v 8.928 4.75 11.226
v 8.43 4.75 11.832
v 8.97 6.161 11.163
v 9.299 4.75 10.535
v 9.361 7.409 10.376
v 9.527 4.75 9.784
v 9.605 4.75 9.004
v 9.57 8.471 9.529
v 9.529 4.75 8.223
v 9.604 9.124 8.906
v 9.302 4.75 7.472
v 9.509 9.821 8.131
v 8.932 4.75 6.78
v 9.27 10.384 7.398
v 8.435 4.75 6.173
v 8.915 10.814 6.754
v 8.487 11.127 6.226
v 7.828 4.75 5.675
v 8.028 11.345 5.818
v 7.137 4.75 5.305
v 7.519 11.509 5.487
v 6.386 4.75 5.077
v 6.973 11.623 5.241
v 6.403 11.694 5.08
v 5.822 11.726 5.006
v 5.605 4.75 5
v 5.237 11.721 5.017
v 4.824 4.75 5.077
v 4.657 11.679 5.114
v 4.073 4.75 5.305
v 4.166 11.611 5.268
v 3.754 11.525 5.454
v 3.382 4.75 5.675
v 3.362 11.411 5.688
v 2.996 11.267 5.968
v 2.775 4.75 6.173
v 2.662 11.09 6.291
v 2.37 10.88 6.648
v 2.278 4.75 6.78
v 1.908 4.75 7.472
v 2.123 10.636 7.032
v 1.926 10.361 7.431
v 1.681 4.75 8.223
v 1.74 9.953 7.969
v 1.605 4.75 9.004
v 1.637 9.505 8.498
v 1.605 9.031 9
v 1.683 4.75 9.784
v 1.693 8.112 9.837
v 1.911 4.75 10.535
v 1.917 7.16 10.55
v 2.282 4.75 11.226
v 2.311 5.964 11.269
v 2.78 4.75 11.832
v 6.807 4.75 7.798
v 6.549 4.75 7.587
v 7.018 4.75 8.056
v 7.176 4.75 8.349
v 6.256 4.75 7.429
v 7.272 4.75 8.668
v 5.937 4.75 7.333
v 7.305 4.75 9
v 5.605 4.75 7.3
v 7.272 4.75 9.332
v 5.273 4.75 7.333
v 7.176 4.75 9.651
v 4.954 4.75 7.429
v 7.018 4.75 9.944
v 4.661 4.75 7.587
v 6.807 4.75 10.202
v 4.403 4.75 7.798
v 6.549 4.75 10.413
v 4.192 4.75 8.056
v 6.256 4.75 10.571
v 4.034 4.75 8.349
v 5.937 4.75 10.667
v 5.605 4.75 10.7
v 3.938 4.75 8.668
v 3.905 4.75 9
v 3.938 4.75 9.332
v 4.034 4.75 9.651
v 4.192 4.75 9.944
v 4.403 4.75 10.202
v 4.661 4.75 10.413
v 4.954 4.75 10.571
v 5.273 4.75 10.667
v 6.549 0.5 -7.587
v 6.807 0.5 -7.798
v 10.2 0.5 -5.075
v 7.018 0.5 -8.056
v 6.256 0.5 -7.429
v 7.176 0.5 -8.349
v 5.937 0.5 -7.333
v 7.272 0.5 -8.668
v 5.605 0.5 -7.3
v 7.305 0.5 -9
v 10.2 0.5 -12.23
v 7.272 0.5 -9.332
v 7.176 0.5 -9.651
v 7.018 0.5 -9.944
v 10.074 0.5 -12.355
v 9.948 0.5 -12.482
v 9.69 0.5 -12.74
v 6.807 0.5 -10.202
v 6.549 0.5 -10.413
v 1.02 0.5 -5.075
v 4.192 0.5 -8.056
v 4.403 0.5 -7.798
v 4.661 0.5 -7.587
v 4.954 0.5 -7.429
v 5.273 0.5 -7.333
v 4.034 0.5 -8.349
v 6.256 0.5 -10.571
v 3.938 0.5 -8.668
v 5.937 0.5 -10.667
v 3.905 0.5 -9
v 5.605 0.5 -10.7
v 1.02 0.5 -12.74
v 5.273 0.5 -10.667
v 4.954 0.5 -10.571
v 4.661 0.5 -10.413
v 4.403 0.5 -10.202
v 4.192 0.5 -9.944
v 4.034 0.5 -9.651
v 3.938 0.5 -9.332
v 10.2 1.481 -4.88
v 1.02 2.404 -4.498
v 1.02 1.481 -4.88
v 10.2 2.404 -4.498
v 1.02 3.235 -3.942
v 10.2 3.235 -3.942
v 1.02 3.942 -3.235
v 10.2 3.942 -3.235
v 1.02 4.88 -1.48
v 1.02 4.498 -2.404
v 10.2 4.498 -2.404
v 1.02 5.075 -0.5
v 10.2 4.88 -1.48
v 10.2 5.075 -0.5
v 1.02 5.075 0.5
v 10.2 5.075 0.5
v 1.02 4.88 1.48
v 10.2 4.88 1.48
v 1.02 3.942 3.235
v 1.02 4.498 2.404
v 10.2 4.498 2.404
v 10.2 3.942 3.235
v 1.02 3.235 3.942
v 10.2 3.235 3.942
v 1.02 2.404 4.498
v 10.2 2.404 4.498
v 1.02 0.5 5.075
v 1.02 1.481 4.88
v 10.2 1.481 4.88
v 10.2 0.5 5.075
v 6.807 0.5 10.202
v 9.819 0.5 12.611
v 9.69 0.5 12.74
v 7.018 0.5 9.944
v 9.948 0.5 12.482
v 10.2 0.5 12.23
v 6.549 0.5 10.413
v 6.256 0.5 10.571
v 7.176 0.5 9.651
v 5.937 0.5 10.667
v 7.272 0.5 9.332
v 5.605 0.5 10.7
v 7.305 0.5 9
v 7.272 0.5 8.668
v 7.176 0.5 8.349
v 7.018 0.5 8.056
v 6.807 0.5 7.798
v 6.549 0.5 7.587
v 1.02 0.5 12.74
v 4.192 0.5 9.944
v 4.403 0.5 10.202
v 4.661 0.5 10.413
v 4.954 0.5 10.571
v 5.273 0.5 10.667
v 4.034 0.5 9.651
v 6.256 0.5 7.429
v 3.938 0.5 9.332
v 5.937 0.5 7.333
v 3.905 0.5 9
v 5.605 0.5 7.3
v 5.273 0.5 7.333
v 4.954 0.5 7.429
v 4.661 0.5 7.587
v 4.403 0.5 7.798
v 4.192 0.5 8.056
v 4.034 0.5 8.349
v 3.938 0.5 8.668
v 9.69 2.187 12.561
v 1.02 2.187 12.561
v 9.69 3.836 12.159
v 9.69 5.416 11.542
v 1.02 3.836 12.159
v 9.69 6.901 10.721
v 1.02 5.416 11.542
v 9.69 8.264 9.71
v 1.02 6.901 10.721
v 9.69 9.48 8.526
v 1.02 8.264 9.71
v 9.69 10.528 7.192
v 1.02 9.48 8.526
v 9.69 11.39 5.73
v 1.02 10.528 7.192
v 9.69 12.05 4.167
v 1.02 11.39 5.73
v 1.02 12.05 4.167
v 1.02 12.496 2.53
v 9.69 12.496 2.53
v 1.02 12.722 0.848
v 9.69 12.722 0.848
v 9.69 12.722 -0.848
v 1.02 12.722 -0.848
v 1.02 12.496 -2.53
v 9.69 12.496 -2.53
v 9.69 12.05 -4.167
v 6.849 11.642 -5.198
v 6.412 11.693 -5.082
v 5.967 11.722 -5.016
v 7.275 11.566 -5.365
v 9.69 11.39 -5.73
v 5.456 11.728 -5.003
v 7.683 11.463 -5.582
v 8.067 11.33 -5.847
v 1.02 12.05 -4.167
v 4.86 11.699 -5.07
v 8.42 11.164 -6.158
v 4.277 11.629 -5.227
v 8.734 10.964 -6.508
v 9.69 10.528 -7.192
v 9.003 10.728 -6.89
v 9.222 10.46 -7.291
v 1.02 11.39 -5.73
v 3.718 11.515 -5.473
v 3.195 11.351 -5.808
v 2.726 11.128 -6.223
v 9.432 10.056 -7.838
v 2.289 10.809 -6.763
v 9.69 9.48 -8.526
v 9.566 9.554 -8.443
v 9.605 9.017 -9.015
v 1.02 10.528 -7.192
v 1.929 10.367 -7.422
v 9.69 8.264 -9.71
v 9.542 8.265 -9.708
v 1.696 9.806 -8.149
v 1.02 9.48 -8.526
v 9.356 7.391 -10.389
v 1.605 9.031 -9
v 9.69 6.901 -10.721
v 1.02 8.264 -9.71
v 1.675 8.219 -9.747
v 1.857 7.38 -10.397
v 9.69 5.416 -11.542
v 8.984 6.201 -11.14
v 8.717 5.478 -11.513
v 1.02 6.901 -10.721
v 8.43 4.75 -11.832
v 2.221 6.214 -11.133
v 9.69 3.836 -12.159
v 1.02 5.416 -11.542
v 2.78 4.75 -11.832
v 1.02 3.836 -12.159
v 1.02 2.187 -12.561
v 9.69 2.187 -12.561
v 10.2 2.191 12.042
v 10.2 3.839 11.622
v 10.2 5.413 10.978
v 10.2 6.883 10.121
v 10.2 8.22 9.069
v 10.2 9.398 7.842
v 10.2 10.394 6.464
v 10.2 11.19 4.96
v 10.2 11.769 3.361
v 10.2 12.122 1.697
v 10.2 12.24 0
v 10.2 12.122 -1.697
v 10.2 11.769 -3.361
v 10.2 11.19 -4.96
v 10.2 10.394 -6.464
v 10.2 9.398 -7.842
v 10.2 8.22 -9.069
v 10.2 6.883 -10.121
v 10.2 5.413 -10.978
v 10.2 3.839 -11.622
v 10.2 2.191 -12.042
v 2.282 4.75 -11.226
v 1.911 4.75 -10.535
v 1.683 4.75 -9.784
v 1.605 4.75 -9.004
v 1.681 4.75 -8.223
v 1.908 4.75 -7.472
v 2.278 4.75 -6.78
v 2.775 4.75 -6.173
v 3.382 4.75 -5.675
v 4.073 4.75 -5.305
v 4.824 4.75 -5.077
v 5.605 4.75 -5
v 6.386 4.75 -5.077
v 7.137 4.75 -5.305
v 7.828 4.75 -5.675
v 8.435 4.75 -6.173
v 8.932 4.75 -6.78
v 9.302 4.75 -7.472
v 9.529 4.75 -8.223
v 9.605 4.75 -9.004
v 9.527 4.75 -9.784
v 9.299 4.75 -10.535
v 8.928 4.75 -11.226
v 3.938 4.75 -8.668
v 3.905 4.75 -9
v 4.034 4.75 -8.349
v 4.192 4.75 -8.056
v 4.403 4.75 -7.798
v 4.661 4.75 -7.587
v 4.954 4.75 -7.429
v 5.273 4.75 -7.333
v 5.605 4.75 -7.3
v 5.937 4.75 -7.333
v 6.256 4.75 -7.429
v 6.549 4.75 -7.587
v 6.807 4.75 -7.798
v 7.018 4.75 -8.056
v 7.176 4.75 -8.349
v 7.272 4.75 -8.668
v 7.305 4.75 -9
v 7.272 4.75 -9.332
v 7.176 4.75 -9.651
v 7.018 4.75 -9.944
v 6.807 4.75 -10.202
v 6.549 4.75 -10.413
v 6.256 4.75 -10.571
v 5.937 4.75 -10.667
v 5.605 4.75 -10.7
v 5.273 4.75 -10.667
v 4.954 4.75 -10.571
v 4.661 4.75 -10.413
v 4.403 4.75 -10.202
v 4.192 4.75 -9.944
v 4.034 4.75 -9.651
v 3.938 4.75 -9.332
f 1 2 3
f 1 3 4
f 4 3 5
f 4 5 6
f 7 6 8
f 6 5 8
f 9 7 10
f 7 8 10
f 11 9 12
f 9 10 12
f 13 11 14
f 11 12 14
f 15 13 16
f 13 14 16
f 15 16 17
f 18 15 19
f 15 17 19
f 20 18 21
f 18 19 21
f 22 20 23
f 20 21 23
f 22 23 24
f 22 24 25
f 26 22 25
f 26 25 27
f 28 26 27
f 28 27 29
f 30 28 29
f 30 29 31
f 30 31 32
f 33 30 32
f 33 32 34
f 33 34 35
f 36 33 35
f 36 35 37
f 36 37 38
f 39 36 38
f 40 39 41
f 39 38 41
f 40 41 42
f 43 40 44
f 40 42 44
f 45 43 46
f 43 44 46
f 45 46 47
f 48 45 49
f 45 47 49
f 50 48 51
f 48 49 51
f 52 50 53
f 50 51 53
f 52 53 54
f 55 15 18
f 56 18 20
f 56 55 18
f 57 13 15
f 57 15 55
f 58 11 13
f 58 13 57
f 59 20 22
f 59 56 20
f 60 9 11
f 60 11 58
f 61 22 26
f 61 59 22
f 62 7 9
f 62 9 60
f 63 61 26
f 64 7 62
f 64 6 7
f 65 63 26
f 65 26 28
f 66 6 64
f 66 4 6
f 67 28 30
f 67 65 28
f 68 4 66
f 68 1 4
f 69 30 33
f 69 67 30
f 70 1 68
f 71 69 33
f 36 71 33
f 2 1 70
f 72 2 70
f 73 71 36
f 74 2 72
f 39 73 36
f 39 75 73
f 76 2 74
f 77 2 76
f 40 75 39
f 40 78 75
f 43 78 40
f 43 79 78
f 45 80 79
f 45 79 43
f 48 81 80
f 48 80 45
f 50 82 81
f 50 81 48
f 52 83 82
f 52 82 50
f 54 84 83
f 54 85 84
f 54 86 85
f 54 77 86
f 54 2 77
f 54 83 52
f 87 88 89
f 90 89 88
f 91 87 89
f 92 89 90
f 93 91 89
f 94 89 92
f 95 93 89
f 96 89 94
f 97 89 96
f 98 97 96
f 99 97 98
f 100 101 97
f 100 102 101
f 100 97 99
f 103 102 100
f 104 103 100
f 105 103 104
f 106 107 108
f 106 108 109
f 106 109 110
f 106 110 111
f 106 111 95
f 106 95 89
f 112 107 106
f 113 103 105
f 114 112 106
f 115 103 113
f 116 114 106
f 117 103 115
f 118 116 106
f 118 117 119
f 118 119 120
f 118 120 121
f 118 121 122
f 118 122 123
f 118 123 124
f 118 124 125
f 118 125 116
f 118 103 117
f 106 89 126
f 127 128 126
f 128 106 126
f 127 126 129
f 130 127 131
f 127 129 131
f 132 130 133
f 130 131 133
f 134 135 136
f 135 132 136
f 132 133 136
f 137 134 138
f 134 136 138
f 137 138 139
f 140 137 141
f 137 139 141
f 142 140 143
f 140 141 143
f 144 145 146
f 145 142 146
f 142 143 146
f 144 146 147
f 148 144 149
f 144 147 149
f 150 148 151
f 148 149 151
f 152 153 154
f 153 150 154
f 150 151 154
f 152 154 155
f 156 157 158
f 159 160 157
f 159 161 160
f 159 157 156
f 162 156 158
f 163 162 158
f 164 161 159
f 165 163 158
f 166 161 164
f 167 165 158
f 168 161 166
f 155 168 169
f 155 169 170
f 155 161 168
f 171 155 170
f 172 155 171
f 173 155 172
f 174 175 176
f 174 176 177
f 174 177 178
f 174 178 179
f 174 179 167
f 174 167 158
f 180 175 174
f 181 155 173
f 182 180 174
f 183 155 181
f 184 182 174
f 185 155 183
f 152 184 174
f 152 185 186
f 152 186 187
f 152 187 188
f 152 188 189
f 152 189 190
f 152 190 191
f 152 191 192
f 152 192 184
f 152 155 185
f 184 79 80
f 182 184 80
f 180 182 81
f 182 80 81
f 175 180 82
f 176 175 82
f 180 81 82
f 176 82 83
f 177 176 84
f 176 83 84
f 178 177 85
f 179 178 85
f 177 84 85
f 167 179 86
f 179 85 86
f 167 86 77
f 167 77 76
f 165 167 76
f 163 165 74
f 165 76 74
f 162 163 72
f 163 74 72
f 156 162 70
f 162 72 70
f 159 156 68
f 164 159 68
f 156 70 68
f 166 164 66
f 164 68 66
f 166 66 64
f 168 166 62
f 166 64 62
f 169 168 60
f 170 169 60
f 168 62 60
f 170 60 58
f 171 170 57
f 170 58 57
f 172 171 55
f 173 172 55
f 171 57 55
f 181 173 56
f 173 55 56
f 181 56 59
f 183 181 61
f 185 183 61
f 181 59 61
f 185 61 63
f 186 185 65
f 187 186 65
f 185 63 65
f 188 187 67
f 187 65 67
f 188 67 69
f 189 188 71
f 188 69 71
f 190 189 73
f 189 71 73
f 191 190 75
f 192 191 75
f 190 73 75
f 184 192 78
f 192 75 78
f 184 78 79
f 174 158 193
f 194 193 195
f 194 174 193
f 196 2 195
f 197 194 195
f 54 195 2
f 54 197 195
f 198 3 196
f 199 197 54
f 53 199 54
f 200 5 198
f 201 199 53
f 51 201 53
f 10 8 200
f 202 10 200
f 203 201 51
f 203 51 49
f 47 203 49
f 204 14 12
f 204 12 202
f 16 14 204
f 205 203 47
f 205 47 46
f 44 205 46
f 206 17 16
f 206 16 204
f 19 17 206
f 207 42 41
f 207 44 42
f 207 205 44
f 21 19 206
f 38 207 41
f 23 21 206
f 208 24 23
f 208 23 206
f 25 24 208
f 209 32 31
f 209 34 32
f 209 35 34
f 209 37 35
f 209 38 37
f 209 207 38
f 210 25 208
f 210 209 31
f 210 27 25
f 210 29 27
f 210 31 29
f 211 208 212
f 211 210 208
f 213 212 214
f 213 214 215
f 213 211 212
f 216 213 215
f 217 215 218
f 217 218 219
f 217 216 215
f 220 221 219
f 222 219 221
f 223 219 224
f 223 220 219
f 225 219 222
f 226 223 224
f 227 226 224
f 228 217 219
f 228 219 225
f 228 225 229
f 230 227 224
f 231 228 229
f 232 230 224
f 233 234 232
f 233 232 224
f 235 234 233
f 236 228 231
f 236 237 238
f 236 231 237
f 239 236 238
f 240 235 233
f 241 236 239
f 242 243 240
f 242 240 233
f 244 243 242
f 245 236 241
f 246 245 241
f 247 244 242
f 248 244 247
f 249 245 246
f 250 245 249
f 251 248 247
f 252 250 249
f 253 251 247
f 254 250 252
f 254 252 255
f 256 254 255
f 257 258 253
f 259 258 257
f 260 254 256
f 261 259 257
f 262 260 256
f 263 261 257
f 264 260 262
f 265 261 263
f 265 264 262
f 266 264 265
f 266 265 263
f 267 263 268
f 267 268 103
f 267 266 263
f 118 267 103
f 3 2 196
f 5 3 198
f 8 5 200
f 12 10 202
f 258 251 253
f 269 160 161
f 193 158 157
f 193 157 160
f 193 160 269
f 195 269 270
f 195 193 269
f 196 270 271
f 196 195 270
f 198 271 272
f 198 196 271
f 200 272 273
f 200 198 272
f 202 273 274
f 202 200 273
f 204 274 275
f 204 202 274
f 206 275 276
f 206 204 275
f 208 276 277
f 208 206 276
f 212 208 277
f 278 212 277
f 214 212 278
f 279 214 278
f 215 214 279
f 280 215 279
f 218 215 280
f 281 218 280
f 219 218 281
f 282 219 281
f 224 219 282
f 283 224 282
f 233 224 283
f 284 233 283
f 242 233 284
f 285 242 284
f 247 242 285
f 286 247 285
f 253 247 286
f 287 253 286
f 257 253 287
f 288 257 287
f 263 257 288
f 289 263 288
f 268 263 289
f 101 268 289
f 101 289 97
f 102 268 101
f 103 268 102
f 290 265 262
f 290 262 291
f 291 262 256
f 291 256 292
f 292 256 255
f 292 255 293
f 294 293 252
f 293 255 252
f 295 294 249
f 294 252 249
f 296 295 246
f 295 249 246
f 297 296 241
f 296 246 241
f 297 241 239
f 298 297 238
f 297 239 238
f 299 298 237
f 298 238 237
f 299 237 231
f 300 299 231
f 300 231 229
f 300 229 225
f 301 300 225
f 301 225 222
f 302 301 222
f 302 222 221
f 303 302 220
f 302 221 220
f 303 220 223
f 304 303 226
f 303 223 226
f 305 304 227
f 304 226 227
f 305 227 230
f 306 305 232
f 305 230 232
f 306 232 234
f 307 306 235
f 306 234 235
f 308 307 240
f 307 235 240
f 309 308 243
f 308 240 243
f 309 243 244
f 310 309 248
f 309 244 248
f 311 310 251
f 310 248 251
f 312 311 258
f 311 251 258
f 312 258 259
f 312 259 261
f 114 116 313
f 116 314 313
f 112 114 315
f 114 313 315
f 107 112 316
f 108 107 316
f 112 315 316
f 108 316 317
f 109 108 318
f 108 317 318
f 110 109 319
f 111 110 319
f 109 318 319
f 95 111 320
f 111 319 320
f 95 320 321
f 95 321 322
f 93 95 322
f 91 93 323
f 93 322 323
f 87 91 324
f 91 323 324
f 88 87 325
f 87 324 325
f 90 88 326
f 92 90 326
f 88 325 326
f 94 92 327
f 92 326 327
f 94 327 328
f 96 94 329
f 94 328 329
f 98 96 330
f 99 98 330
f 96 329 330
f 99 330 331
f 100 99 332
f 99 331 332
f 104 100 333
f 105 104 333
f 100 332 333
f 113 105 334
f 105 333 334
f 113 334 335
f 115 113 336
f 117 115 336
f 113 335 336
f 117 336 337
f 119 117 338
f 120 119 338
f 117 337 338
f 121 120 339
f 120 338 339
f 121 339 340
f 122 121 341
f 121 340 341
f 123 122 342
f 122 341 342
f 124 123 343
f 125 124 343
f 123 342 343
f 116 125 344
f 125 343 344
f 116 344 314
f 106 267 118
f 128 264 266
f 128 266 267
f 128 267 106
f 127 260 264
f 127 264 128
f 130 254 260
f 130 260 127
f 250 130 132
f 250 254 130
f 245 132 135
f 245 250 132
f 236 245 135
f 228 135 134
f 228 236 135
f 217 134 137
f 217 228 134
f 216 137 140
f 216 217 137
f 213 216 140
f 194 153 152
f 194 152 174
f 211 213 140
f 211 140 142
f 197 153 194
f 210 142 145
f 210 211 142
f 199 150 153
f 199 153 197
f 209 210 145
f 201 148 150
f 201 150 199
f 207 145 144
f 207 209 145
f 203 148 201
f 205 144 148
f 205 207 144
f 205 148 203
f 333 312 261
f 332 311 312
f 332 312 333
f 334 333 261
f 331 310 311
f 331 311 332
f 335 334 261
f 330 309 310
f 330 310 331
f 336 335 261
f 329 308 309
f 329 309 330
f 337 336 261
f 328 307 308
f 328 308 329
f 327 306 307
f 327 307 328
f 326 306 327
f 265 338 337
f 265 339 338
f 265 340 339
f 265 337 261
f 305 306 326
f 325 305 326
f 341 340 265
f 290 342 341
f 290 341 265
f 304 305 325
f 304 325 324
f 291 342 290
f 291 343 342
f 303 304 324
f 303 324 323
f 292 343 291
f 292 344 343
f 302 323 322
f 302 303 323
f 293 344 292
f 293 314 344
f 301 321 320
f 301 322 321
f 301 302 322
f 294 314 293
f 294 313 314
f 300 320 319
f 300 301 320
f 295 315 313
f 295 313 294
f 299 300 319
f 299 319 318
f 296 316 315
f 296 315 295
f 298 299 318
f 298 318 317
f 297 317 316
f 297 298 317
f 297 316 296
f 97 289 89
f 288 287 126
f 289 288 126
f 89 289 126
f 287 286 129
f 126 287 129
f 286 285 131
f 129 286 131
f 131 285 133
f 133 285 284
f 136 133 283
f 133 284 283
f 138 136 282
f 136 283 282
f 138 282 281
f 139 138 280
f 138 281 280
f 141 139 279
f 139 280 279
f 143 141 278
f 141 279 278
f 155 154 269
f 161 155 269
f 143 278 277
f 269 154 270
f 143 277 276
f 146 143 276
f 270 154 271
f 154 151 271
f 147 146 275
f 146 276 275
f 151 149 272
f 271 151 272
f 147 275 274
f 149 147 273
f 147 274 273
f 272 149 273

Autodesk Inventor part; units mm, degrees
sketch "Sketch_1" plane through (0, 0, 0) normal (0, 0, 1) x (1, 0, 0)
  line L0 (10.2, 0) -> (0, 0)
  line L1 (1.02, 5.1) -> (10.2, 5.1)
  line L2 (10.2, 5.1) -> (10.2, 12.24)
  line L3 (10.2, 12.24) -> (9.69, 12.75)
  line L4 (9.69, 12.75) -> (1.02, 12.75)
  line L5 (1.02, 12.75) -> (1.02, 5.1)
  dimension "d15" = 5.1
revolve "Revolution1" add sketch "Sketch_1" angle 180 mid plane about axis through (10.2, 0, 0) along (-1, 0, 0)
sketch "Sketch_2" plane through (0, 0, 0) normal (0, 0, 1) x (1, 0, 0)
  line L0 (0, 0.5) -> (0, 0)
  line L1 (0, 0) -> (20, 0)
  line L2 (20, 0) -> (20, 0.5)
  line L3 (20, 0.5) -> (0, 0.5)
extrude "Extrusion1" cut sketch "Sketch_2" along normal mid plane 50
ref_plane "part2_to_part1_XY" through (0, 0, 0) normal (1, 0, 0) x (0, 0, -1)
ref_plane "part2_to_part1_YZ" through (0, 0, 0) normal (0, 0, -1) x (0, 1, 0)
ref_plane "part2_to_part1_ZX" through (0, 0, 0) normal (0, 1, 0) x (1, 0, 0)
ref_plane "part2_to_screw1_XY" through (5.5, 4.5, 9) normal (0, 1, 0) x (1, 0, 0)
ref_plane "part2_to_screw1_YZ" through (5.5, 4.5, 9) normal (1, 0, 0) x (0, 0, -1)
ref_plane "part2_to_screw1_ZX" through (5.5, 4.5, 9) normal (0, 0, -1) x (0, 1, 0)
ref_plane "part2_to_screw2_XY" through (5.5, 4.5, -9) normal (0, 1, 0) x (1, 0, 0)
ref_plane "part2_to_screw2_YZ" through (5.5, 4.5, -9) normal (1, 0, 0) x (0, 0, -1)
ref_plane "part2_to_screw2_ZX" through (5.5, 4.5, -9) normal (0, 0, -1) x (0, 1, 0)
ref_plane "作業平面10" through (5.355, 12.75, 0) normal (0, 1, 0) x (-1, 0, 0)
sketch "スケッチ6" plane through (5.355, 12.75, 0) normal (0, 1, 0) x (-1, 0, 0)
  circle A0 centre (-0.25, -9) radius 2.25 projected
  circle A1 centre (-0.25, -9) radius 4
  circle A2 centre (-0.25, -9) radius 1.7
  circle A3 centre (-0.25, 9) radius 2.25 projected
  circle A4 centre (-0.25, 9) radius 4
  circle A5 centre (-0.25, 9) radius 1.7
  point P0 (5.355, 0)
  dimension "d7" = 8
  dimension "d8" = 3.4
  dimension "d9" = 8
  dimension "d10" = 3.4
extrude "押し出し2" cut sketch "スケッチ6" against normal through all contours A2 | A5
extrude "押し出し3" cut sketch "スケッチ6" against normal blind 8 contours A0 | A1 | A2 | A3 | A4 | A5
properties part number "MBRDAC45-2-10_p2"
